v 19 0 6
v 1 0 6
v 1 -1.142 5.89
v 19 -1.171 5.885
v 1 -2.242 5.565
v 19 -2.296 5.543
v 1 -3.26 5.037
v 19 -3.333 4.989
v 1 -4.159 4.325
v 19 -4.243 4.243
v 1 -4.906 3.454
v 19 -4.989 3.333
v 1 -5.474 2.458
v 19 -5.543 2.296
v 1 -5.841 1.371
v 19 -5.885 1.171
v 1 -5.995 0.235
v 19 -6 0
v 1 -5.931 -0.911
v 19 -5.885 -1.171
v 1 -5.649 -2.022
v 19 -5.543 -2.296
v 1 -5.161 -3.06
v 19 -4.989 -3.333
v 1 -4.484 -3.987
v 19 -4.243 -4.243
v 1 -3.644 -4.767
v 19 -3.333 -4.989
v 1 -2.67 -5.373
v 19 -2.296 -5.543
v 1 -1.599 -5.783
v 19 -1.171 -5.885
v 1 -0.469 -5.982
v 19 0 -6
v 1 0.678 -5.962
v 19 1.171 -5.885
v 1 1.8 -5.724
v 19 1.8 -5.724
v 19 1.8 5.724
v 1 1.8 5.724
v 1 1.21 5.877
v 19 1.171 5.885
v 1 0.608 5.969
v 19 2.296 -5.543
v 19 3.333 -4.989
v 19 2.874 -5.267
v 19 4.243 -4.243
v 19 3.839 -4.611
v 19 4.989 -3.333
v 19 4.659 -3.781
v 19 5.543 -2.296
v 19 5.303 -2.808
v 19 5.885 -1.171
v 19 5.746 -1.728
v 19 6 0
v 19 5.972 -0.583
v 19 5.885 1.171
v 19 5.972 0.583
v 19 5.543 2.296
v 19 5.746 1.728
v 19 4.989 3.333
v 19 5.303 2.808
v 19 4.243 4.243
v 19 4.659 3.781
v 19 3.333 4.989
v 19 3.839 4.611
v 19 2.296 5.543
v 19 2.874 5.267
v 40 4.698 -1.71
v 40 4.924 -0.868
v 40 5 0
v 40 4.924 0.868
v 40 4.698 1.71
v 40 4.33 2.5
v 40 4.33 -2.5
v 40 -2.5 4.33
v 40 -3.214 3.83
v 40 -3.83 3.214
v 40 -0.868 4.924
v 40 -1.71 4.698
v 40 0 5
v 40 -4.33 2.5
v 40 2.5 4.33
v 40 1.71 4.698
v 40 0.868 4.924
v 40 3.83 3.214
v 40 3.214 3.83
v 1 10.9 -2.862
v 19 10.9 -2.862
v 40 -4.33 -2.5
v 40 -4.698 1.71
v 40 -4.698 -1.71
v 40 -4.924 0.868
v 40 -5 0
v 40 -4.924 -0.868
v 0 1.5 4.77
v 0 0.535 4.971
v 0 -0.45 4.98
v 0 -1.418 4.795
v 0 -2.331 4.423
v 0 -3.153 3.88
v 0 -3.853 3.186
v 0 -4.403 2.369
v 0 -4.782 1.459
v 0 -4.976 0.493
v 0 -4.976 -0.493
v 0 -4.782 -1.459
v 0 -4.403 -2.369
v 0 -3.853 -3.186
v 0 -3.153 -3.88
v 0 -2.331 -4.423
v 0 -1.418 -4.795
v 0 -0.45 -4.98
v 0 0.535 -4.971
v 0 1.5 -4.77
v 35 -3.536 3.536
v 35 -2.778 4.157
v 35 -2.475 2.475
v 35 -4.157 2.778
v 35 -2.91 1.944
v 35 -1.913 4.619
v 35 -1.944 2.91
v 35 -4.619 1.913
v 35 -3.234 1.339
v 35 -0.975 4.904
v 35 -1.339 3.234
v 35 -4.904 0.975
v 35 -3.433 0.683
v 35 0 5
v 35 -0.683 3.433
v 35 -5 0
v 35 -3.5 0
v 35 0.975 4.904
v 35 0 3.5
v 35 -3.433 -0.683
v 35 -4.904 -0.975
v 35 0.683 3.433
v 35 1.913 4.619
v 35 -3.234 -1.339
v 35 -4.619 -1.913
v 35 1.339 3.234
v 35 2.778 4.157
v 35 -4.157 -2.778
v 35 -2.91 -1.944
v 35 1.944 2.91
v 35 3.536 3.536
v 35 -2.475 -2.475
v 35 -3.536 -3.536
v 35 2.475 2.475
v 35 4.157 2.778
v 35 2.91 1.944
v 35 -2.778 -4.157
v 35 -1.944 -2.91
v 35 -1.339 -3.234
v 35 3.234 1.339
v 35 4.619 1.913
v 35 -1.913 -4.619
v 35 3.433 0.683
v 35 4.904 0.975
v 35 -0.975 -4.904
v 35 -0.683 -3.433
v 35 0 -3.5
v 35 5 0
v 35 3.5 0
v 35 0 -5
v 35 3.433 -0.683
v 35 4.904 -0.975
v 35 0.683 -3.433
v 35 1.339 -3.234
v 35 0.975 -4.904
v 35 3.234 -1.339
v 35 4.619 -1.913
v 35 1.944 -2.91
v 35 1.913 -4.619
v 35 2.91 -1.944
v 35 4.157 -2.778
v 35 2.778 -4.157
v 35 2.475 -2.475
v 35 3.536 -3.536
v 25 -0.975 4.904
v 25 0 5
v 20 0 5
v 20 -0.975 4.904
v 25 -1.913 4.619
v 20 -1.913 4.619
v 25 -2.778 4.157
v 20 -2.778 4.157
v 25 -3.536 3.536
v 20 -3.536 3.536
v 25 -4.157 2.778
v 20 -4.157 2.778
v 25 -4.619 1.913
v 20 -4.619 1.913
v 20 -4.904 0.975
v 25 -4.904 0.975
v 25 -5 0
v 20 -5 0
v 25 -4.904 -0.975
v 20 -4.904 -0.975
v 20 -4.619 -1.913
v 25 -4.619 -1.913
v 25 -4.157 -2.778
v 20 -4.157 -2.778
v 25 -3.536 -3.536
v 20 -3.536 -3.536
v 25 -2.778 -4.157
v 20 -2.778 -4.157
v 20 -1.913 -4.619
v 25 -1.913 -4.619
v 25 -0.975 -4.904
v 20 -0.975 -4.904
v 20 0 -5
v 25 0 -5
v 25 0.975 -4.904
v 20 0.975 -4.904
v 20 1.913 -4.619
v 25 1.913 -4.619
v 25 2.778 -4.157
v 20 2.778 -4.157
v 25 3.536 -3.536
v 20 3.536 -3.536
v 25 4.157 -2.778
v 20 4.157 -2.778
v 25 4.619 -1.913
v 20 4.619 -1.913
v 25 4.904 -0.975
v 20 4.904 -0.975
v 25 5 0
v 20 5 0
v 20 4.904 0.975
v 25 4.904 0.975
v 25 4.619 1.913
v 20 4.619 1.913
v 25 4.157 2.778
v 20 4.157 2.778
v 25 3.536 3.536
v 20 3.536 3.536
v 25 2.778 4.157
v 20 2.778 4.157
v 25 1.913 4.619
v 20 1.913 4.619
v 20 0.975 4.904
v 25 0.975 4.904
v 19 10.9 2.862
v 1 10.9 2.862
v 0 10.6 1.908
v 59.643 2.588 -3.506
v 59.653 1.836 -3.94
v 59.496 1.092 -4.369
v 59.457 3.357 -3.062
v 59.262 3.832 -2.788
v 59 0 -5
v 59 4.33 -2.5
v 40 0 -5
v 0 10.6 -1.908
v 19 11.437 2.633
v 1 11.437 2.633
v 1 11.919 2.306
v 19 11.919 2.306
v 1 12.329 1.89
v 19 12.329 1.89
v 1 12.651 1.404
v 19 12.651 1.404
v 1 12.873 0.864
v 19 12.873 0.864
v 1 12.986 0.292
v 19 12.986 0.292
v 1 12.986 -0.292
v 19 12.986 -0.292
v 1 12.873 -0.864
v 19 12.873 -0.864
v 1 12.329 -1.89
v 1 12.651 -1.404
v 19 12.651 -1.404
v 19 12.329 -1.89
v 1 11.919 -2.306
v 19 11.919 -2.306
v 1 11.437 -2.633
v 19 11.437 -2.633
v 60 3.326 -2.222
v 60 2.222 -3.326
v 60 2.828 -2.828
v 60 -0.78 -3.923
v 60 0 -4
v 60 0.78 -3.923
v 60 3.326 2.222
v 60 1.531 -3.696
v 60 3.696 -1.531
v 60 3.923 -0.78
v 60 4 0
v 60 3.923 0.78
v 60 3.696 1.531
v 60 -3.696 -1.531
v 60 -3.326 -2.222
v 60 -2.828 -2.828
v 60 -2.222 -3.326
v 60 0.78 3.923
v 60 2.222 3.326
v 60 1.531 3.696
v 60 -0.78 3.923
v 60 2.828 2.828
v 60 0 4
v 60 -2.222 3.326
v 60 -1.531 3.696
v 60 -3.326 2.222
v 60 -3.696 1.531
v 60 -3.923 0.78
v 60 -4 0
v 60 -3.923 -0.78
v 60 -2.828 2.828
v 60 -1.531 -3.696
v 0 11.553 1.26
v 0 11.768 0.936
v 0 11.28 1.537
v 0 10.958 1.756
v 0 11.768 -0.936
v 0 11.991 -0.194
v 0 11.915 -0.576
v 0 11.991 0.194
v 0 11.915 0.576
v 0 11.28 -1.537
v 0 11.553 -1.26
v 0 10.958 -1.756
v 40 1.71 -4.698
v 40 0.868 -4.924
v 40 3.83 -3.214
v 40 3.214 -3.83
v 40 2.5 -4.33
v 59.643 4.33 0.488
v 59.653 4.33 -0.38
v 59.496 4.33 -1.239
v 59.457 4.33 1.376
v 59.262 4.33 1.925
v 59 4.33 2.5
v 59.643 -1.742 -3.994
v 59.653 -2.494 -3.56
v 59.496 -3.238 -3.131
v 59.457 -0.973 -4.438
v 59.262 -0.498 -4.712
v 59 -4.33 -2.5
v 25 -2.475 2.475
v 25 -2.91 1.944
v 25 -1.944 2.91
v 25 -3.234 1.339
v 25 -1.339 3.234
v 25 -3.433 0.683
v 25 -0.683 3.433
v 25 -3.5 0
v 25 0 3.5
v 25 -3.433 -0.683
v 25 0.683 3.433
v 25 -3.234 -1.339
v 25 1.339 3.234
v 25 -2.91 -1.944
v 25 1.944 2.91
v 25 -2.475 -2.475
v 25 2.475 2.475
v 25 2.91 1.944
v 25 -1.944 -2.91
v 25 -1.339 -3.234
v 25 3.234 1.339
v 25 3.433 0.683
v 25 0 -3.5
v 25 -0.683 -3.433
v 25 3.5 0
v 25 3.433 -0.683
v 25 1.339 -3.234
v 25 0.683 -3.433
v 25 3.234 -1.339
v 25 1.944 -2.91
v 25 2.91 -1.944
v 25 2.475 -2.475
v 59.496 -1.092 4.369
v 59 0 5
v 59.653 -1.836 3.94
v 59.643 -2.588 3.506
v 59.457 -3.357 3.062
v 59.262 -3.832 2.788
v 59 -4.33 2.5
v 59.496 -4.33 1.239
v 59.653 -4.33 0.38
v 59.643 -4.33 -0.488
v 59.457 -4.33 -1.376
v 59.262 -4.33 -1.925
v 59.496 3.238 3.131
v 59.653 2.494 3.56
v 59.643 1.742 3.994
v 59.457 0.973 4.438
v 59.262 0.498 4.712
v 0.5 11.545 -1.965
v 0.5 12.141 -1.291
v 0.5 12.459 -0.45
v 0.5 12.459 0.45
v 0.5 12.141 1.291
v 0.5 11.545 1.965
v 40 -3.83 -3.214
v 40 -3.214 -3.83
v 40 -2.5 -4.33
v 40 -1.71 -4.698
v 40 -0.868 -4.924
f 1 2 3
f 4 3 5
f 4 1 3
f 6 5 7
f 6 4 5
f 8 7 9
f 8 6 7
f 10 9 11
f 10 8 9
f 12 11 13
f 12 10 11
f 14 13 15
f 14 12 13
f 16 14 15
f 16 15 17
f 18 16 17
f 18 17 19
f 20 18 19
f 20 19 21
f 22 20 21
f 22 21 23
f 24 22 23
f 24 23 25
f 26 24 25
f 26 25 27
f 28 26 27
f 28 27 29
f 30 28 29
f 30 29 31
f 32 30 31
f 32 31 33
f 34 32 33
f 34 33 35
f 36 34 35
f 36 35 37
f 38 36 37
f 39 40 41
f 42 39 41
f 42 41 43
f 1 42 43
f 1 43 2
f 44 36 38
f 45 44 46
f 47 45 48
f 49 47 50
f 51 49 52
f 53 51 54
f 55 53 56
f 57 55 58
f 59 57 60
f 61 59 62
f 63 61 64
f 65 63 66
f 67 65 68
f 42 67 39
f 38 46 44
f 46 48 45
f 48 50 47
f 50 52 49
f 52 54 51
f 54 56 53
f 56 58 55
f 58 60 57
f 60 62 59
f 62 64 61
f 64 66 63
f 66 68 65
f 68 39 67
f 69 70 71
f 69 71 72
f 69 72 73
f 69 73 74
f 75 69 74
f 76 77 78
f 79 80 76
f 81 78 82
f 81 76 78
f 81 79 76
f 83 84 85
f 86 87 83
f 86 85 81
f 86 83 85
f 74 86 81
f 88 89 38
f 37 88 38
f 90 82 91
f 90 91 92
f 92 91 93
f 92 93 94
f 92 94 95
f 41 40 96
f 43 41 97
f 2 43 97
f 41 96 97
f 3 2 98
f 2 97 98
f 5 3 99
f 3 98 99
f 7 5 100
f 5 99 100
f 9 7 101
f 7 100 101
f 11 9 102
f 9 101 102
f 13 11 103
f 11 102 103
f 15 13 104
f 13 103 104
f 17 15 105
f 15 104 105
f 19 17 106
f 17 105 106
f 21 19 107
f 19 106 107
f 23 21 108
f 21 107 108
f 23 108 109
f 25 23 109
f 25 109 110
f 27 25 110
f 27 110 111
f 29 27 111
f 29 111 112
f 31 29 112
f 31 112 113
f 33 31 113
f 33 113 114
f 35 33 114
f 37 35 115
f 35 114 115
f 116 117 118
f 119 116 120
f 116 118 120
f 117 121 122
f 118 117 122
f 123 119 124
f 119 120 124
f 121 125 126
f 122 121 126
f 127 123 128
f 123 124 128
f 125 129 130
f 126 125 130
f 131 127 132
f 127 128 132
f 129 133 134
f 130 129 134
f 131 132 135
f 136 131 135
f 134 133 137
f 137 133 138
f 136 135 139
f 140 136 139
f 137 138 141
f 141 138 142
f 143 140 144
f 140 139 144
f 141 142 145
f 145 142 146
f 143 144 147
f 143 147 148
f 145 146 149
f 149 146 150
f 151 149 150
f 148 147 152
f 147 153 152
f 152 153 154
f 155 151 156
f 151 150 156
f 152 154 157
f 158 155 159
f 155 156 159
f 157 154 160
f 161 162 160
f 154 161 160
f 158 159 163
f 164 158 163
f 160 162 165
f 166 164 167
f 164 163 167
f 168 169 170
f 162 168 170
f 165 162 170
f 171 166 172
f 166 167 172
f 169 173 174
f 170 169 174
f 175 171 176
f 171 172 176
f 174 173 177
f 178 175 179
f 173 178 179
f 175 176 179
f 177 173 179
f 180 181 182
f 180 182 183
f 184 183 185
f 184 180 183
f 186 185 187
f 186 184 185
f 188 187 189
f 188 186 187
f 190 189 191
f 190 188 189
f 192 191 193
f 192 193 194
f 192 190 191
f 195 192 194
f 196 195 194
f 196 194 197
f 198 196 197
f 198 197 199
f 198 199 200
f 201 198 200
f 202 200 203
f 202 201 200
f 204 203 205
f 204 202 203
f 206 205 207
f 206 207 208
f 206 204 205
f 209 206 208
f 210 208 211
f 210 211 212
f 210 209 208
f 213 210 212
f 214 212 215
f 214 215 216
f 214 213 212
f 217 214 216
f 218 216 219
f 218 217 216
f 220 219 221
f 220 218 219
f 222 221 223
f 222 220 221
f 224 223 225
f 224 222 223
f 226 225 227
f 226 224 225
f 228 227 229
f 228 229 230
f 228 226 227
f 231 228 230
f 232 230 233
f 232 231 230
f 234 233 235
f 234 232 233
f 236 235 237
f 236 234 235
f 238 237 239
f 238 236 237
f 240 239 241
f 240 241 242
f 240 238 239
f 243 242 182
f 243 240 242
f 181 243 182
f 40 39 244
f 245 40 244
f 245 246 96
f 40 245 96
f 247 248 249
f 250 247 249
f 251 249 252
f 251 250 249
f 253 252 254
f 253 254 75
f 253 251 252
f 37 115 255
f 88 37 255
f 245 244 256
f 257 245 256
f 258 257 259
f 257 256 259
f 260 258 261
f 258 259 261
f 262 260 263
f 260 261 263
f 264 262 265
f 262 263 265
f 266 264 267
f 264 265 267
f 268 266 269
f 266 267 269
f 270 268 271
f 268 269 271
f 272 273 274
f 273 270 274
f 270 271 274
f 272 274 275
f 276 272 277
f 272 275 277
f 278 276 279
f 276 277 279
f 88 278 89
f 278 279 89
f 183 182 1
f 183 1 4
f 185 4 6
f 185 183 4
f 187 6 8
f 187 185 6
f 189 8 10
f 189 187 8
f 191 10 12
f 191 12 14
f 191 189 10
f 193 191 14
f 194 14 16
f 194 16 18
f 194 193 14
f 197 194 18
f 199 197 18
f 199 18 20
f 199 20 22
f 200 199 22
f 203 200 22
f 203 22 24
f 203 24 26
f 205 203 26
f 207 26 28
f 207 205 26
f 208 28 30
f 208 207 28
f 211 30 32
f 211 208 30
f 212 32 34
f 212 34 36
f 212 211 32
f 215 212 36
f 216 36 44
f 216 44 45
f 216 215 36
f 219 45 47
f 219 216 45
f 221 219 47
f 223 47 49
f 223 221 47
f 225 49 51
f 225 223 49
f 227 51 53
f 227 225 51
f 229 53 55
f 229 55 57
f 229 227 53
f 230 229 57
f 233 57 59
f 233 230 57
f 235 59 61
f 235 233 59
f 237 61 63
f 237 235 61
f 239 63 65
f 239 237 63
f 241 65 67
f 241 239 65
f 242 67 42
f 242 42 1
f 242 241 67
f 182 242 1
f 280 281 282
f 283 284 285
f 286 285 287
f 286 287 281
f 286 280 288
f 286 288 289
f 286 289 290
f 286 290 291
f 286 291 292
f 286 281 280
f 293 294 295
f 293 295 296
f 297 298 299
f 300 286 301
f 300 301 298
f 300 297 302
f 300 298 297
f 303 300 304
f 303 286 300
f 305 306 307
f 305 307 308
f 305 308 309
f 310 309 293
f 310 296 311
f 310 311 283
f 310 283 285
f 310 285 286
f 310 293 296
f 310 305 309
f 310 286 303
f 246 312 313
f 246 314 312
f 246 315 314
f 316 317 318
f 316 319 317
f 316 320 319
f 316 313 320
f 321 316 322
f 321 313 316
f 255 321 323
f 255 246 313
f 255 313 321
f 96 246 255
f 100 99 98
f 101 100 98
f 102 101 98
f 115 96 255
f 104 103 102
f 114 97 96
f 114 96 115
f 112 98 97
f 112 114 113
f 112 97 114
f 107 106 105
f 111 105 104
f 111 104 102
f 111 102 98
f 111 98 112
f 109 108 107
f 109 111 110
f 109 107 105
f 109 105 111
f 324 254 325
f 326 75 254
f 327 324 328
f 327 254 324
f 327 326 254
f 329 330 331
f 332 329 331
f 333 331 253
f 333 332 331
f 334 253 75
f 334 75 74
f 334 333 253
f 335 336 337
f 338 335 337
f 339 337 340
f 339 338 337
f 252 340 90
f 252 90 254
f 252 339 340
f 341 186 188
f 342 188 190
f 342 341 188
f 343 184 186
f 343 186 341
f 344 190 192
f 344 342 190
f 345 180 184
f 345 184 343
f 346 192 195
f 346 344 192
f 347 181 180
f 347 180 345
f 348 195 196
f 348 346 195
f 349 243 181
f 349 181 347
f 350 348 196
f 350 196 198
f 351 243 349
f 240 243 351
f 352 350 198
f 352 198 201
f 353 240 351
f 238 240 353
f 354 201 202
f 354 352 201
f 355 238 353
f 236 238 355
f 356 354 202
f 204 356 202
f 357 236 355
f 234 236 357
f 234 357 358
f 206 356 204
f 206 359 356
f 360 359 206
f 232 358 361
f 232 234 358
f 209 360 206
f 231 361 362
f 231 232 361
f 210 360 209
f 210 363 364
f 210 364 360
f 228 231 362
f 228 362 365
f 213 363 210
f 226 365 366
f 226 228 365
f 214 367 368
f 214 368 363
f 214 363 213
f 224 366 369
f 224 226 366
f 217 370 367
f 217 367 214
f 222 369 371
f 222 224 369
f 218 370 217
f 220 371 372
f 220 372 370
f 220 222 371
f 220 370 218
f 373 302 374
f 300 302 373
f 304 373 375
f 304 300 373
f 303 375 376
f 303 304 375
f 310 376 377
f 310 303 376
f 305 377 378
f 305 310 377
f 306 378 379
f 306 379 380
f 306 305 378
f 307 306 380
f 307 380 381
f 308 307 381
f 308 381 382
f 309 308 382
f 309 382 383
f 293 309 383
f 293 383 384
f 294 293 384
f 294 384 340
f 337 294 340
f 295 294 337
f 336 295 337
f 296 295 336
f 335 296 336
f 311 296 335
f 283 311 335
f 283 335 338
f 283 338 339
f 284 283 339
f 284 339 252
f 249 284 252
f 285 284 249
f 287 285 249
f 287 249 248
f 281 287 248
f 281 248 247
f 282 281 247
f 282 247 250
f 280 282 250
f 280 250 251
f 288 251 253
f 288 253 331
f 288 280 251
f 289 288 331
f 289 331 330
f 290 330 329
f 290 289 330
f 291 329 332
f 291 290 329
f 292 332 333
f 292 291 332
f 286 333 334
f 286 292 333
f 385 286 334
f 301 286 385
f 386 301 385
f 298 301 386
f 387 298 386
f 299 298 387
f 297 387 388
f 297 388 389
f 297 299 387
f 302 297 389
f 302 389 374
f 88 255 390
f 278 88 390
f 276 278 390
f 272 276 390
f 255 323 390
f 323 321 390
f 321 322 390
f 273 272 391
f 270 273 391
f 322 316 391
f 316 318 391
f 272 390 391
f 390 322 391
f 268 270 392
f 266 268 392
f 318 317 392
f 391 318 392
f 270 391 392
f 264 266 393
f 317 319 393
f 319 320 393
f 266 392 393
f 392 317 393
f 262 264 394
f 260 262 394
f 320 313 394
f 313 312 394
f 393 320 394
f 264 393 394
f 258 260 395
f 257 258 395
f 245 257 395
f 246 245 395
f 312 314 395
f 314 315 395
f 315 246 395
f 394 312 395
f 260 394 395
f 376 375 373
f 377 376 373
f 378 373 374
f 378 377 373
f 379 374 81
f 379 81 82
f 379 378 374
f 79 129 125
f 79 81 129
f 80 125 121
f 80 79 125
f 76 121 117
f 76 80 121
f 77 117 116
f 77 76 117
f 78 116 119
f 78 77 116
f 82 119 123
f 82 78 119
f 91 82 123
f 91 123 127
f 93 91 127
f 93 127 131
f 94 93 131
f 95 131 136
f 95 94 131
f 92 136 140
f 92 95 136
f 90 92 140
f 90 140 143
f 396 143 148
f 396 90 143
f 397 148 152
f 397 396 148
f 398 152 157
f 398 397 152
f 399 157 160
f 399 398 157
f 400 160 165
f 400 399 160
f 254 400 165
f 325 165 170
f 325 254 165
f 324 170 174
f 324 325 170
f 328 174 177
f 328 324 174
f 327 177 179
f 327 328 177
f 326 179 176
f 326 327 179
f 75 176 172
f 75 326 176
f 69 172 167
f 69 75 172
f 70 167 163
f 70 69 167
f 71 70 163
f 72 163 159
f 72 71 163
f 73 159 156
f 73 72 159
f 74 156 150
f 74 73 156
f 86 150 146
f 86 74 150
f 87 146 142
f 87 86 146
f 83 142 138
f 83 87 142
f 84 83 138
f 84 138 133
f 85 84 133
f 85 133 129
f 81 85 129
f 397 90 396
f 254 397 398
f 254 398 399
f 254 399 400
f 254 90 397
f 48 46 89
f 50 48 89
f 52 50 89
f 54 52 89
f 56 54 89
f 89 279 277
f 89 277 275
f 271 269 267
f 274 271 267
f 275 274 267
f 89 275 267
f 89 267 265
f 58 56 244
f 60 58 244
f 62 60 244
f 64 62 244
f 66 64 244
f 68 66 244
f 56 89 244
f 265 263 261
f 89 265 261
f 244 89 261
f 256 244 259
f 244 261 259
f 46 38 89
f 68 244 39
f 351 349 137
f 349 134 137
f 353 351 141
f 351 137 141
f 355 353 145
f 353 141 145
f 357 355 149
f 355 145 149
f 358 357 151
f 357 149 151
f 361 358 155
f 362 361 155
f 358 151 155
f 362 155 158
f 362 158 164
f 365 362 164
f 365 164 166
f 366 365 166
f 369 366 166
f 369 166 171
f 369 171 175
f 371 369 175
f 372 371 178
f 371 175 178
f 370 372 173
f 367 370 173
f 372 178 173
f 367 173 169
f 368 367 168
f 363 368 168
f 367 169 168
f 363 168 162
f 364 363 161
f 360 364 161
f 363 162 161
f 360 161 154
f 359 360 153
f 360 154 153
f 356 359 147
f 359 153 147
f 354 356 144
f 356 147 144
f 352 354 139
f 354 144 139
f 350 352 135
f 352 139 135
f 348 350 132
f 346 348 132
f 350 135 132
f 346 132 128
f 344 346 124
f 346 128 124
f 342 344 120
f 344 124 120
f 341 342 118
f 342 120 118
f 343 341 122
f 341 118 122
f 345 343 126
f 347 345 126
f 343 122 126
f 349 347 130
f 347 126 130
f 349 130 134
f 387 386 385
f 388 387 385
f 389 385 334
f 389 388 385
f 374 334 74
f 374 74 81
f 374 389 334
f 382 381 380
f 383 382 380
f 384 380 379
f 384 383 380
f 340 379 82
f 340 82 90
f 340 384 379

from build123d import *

# Parameters (mm, degrees)
CHAMFER1_SIZE       = 1
BOSS_EXTRUDE1_START = -19
BOSS_EXTRUDE1_DEPTH = 19
CHAMFER2_SIZE       = 1
SKETCH3_OUTSIDE_W   = 26.814
SKETCH3_OUTSIDE_H   = 33.814
CUT_EXTRUDE1_DEPTH  = 20
SKETCH4_W           = 10
SKETCH4_H           = 4.464883459


with BuildPart() as part:
    # Sketch1 → Revolve1 (revolve)
    with BuildSketch(Plane.XY, mode=Mode.PRIVATE) as revolve1_sk:
        Polygon((0, 0), (0, 6), (20, 6), (20, 5), (60, 5), (60, 0), align=None)
    revolve(revolve1_sk.sketch.rotate(Axis((0, 0, 0), (1, 0, 0)), 90), axis=Axis((0, 0, 0), (1, 0, 0)))

    # Chamfer1
    chamfer1_edges = [part.edges().sort_by_distance(p)[0] for p in [
        (60, 0, -5),
        (20, 0, -6),
    ]]
    chamfer(chamfer1_edges, length=CHAMFER1_SIZE - 0.0001)  # a hair under: the kernel refuses the full size

    # Sketch2 → Boss-Extrude1 (add)
    with BuildSketch(Plane.ZY.offset(BOSS_EXTRUDE1_START)):
        with BuildLine():
            ThreePointArc((2.861817604, 10.9), (0, 13), (-2.861817604, 10.9))
            Line((-2.861817604, 10.9), (-5.723635209, 1.8))
            ThreePointArc((-5.723635209, 1.8), (0, 6), (5.723635209, 1.8))
            Line((5.723635209, 1.8), (2.861817604, 10.9))
        make_face()
    extrude(amount=BOSS_EXTRUDE1_DEPTH)

    # Chamfer2
    chamfer2_edges = [part.edges().sort_by_distance(p)[0] for p in [
        (0, -5.930506355, -0.910546196),
        (0, 6.35, 4.292726406),
        (0, 13, 0),
        (0, 6.35, -4.292726406),
    ]]
    chamfer(chamfer2_edges, length=CHAMFER2_SIZE)

    # Sketch3 outside → Cut-Extrude1 (cut)
    with BuildSketch(Plane(origin=(60, 0, 0), x_dir=(0, 0, -1), z_dir=(1, 0, 0))):
        with Locations((0, 3.5)):
            Rectangle(SKETCH3_OUTSIDE_W, SKETCH3_OUTSIDE_H)
        Polygon((5, 0), (2.5, 4.330127019), (-2.5, 4.330127019), (-5, 0), (-2.5, -4.330127019), (2.5, -4.330127019), align=None, mode=Mode.SUBTRACT)
    extrude(amount=-CUT_EXTRUDE1_DEPTH, mode=Mode.SUBTRACT)

    # Sketch4 → Cut-Revolve1 (revolve, cut)
    with BuildSketch(Plane.XY, mode=Mode.PRIVATE) as cut_revolve1_sk:
        with Locations((30, 5.732441729)):
            Rectangle(SKETCH4_W, SKETCH4_H)
    revolve(cut_revolve1_sk.sketch.rotate(Axis((40, 0, 0), (-1, 0, 0)), 270), axis=Axis((40, 0, 0), (-1, 0, 0)), mode=Mode.SUBTRACT)


solid = part.part
